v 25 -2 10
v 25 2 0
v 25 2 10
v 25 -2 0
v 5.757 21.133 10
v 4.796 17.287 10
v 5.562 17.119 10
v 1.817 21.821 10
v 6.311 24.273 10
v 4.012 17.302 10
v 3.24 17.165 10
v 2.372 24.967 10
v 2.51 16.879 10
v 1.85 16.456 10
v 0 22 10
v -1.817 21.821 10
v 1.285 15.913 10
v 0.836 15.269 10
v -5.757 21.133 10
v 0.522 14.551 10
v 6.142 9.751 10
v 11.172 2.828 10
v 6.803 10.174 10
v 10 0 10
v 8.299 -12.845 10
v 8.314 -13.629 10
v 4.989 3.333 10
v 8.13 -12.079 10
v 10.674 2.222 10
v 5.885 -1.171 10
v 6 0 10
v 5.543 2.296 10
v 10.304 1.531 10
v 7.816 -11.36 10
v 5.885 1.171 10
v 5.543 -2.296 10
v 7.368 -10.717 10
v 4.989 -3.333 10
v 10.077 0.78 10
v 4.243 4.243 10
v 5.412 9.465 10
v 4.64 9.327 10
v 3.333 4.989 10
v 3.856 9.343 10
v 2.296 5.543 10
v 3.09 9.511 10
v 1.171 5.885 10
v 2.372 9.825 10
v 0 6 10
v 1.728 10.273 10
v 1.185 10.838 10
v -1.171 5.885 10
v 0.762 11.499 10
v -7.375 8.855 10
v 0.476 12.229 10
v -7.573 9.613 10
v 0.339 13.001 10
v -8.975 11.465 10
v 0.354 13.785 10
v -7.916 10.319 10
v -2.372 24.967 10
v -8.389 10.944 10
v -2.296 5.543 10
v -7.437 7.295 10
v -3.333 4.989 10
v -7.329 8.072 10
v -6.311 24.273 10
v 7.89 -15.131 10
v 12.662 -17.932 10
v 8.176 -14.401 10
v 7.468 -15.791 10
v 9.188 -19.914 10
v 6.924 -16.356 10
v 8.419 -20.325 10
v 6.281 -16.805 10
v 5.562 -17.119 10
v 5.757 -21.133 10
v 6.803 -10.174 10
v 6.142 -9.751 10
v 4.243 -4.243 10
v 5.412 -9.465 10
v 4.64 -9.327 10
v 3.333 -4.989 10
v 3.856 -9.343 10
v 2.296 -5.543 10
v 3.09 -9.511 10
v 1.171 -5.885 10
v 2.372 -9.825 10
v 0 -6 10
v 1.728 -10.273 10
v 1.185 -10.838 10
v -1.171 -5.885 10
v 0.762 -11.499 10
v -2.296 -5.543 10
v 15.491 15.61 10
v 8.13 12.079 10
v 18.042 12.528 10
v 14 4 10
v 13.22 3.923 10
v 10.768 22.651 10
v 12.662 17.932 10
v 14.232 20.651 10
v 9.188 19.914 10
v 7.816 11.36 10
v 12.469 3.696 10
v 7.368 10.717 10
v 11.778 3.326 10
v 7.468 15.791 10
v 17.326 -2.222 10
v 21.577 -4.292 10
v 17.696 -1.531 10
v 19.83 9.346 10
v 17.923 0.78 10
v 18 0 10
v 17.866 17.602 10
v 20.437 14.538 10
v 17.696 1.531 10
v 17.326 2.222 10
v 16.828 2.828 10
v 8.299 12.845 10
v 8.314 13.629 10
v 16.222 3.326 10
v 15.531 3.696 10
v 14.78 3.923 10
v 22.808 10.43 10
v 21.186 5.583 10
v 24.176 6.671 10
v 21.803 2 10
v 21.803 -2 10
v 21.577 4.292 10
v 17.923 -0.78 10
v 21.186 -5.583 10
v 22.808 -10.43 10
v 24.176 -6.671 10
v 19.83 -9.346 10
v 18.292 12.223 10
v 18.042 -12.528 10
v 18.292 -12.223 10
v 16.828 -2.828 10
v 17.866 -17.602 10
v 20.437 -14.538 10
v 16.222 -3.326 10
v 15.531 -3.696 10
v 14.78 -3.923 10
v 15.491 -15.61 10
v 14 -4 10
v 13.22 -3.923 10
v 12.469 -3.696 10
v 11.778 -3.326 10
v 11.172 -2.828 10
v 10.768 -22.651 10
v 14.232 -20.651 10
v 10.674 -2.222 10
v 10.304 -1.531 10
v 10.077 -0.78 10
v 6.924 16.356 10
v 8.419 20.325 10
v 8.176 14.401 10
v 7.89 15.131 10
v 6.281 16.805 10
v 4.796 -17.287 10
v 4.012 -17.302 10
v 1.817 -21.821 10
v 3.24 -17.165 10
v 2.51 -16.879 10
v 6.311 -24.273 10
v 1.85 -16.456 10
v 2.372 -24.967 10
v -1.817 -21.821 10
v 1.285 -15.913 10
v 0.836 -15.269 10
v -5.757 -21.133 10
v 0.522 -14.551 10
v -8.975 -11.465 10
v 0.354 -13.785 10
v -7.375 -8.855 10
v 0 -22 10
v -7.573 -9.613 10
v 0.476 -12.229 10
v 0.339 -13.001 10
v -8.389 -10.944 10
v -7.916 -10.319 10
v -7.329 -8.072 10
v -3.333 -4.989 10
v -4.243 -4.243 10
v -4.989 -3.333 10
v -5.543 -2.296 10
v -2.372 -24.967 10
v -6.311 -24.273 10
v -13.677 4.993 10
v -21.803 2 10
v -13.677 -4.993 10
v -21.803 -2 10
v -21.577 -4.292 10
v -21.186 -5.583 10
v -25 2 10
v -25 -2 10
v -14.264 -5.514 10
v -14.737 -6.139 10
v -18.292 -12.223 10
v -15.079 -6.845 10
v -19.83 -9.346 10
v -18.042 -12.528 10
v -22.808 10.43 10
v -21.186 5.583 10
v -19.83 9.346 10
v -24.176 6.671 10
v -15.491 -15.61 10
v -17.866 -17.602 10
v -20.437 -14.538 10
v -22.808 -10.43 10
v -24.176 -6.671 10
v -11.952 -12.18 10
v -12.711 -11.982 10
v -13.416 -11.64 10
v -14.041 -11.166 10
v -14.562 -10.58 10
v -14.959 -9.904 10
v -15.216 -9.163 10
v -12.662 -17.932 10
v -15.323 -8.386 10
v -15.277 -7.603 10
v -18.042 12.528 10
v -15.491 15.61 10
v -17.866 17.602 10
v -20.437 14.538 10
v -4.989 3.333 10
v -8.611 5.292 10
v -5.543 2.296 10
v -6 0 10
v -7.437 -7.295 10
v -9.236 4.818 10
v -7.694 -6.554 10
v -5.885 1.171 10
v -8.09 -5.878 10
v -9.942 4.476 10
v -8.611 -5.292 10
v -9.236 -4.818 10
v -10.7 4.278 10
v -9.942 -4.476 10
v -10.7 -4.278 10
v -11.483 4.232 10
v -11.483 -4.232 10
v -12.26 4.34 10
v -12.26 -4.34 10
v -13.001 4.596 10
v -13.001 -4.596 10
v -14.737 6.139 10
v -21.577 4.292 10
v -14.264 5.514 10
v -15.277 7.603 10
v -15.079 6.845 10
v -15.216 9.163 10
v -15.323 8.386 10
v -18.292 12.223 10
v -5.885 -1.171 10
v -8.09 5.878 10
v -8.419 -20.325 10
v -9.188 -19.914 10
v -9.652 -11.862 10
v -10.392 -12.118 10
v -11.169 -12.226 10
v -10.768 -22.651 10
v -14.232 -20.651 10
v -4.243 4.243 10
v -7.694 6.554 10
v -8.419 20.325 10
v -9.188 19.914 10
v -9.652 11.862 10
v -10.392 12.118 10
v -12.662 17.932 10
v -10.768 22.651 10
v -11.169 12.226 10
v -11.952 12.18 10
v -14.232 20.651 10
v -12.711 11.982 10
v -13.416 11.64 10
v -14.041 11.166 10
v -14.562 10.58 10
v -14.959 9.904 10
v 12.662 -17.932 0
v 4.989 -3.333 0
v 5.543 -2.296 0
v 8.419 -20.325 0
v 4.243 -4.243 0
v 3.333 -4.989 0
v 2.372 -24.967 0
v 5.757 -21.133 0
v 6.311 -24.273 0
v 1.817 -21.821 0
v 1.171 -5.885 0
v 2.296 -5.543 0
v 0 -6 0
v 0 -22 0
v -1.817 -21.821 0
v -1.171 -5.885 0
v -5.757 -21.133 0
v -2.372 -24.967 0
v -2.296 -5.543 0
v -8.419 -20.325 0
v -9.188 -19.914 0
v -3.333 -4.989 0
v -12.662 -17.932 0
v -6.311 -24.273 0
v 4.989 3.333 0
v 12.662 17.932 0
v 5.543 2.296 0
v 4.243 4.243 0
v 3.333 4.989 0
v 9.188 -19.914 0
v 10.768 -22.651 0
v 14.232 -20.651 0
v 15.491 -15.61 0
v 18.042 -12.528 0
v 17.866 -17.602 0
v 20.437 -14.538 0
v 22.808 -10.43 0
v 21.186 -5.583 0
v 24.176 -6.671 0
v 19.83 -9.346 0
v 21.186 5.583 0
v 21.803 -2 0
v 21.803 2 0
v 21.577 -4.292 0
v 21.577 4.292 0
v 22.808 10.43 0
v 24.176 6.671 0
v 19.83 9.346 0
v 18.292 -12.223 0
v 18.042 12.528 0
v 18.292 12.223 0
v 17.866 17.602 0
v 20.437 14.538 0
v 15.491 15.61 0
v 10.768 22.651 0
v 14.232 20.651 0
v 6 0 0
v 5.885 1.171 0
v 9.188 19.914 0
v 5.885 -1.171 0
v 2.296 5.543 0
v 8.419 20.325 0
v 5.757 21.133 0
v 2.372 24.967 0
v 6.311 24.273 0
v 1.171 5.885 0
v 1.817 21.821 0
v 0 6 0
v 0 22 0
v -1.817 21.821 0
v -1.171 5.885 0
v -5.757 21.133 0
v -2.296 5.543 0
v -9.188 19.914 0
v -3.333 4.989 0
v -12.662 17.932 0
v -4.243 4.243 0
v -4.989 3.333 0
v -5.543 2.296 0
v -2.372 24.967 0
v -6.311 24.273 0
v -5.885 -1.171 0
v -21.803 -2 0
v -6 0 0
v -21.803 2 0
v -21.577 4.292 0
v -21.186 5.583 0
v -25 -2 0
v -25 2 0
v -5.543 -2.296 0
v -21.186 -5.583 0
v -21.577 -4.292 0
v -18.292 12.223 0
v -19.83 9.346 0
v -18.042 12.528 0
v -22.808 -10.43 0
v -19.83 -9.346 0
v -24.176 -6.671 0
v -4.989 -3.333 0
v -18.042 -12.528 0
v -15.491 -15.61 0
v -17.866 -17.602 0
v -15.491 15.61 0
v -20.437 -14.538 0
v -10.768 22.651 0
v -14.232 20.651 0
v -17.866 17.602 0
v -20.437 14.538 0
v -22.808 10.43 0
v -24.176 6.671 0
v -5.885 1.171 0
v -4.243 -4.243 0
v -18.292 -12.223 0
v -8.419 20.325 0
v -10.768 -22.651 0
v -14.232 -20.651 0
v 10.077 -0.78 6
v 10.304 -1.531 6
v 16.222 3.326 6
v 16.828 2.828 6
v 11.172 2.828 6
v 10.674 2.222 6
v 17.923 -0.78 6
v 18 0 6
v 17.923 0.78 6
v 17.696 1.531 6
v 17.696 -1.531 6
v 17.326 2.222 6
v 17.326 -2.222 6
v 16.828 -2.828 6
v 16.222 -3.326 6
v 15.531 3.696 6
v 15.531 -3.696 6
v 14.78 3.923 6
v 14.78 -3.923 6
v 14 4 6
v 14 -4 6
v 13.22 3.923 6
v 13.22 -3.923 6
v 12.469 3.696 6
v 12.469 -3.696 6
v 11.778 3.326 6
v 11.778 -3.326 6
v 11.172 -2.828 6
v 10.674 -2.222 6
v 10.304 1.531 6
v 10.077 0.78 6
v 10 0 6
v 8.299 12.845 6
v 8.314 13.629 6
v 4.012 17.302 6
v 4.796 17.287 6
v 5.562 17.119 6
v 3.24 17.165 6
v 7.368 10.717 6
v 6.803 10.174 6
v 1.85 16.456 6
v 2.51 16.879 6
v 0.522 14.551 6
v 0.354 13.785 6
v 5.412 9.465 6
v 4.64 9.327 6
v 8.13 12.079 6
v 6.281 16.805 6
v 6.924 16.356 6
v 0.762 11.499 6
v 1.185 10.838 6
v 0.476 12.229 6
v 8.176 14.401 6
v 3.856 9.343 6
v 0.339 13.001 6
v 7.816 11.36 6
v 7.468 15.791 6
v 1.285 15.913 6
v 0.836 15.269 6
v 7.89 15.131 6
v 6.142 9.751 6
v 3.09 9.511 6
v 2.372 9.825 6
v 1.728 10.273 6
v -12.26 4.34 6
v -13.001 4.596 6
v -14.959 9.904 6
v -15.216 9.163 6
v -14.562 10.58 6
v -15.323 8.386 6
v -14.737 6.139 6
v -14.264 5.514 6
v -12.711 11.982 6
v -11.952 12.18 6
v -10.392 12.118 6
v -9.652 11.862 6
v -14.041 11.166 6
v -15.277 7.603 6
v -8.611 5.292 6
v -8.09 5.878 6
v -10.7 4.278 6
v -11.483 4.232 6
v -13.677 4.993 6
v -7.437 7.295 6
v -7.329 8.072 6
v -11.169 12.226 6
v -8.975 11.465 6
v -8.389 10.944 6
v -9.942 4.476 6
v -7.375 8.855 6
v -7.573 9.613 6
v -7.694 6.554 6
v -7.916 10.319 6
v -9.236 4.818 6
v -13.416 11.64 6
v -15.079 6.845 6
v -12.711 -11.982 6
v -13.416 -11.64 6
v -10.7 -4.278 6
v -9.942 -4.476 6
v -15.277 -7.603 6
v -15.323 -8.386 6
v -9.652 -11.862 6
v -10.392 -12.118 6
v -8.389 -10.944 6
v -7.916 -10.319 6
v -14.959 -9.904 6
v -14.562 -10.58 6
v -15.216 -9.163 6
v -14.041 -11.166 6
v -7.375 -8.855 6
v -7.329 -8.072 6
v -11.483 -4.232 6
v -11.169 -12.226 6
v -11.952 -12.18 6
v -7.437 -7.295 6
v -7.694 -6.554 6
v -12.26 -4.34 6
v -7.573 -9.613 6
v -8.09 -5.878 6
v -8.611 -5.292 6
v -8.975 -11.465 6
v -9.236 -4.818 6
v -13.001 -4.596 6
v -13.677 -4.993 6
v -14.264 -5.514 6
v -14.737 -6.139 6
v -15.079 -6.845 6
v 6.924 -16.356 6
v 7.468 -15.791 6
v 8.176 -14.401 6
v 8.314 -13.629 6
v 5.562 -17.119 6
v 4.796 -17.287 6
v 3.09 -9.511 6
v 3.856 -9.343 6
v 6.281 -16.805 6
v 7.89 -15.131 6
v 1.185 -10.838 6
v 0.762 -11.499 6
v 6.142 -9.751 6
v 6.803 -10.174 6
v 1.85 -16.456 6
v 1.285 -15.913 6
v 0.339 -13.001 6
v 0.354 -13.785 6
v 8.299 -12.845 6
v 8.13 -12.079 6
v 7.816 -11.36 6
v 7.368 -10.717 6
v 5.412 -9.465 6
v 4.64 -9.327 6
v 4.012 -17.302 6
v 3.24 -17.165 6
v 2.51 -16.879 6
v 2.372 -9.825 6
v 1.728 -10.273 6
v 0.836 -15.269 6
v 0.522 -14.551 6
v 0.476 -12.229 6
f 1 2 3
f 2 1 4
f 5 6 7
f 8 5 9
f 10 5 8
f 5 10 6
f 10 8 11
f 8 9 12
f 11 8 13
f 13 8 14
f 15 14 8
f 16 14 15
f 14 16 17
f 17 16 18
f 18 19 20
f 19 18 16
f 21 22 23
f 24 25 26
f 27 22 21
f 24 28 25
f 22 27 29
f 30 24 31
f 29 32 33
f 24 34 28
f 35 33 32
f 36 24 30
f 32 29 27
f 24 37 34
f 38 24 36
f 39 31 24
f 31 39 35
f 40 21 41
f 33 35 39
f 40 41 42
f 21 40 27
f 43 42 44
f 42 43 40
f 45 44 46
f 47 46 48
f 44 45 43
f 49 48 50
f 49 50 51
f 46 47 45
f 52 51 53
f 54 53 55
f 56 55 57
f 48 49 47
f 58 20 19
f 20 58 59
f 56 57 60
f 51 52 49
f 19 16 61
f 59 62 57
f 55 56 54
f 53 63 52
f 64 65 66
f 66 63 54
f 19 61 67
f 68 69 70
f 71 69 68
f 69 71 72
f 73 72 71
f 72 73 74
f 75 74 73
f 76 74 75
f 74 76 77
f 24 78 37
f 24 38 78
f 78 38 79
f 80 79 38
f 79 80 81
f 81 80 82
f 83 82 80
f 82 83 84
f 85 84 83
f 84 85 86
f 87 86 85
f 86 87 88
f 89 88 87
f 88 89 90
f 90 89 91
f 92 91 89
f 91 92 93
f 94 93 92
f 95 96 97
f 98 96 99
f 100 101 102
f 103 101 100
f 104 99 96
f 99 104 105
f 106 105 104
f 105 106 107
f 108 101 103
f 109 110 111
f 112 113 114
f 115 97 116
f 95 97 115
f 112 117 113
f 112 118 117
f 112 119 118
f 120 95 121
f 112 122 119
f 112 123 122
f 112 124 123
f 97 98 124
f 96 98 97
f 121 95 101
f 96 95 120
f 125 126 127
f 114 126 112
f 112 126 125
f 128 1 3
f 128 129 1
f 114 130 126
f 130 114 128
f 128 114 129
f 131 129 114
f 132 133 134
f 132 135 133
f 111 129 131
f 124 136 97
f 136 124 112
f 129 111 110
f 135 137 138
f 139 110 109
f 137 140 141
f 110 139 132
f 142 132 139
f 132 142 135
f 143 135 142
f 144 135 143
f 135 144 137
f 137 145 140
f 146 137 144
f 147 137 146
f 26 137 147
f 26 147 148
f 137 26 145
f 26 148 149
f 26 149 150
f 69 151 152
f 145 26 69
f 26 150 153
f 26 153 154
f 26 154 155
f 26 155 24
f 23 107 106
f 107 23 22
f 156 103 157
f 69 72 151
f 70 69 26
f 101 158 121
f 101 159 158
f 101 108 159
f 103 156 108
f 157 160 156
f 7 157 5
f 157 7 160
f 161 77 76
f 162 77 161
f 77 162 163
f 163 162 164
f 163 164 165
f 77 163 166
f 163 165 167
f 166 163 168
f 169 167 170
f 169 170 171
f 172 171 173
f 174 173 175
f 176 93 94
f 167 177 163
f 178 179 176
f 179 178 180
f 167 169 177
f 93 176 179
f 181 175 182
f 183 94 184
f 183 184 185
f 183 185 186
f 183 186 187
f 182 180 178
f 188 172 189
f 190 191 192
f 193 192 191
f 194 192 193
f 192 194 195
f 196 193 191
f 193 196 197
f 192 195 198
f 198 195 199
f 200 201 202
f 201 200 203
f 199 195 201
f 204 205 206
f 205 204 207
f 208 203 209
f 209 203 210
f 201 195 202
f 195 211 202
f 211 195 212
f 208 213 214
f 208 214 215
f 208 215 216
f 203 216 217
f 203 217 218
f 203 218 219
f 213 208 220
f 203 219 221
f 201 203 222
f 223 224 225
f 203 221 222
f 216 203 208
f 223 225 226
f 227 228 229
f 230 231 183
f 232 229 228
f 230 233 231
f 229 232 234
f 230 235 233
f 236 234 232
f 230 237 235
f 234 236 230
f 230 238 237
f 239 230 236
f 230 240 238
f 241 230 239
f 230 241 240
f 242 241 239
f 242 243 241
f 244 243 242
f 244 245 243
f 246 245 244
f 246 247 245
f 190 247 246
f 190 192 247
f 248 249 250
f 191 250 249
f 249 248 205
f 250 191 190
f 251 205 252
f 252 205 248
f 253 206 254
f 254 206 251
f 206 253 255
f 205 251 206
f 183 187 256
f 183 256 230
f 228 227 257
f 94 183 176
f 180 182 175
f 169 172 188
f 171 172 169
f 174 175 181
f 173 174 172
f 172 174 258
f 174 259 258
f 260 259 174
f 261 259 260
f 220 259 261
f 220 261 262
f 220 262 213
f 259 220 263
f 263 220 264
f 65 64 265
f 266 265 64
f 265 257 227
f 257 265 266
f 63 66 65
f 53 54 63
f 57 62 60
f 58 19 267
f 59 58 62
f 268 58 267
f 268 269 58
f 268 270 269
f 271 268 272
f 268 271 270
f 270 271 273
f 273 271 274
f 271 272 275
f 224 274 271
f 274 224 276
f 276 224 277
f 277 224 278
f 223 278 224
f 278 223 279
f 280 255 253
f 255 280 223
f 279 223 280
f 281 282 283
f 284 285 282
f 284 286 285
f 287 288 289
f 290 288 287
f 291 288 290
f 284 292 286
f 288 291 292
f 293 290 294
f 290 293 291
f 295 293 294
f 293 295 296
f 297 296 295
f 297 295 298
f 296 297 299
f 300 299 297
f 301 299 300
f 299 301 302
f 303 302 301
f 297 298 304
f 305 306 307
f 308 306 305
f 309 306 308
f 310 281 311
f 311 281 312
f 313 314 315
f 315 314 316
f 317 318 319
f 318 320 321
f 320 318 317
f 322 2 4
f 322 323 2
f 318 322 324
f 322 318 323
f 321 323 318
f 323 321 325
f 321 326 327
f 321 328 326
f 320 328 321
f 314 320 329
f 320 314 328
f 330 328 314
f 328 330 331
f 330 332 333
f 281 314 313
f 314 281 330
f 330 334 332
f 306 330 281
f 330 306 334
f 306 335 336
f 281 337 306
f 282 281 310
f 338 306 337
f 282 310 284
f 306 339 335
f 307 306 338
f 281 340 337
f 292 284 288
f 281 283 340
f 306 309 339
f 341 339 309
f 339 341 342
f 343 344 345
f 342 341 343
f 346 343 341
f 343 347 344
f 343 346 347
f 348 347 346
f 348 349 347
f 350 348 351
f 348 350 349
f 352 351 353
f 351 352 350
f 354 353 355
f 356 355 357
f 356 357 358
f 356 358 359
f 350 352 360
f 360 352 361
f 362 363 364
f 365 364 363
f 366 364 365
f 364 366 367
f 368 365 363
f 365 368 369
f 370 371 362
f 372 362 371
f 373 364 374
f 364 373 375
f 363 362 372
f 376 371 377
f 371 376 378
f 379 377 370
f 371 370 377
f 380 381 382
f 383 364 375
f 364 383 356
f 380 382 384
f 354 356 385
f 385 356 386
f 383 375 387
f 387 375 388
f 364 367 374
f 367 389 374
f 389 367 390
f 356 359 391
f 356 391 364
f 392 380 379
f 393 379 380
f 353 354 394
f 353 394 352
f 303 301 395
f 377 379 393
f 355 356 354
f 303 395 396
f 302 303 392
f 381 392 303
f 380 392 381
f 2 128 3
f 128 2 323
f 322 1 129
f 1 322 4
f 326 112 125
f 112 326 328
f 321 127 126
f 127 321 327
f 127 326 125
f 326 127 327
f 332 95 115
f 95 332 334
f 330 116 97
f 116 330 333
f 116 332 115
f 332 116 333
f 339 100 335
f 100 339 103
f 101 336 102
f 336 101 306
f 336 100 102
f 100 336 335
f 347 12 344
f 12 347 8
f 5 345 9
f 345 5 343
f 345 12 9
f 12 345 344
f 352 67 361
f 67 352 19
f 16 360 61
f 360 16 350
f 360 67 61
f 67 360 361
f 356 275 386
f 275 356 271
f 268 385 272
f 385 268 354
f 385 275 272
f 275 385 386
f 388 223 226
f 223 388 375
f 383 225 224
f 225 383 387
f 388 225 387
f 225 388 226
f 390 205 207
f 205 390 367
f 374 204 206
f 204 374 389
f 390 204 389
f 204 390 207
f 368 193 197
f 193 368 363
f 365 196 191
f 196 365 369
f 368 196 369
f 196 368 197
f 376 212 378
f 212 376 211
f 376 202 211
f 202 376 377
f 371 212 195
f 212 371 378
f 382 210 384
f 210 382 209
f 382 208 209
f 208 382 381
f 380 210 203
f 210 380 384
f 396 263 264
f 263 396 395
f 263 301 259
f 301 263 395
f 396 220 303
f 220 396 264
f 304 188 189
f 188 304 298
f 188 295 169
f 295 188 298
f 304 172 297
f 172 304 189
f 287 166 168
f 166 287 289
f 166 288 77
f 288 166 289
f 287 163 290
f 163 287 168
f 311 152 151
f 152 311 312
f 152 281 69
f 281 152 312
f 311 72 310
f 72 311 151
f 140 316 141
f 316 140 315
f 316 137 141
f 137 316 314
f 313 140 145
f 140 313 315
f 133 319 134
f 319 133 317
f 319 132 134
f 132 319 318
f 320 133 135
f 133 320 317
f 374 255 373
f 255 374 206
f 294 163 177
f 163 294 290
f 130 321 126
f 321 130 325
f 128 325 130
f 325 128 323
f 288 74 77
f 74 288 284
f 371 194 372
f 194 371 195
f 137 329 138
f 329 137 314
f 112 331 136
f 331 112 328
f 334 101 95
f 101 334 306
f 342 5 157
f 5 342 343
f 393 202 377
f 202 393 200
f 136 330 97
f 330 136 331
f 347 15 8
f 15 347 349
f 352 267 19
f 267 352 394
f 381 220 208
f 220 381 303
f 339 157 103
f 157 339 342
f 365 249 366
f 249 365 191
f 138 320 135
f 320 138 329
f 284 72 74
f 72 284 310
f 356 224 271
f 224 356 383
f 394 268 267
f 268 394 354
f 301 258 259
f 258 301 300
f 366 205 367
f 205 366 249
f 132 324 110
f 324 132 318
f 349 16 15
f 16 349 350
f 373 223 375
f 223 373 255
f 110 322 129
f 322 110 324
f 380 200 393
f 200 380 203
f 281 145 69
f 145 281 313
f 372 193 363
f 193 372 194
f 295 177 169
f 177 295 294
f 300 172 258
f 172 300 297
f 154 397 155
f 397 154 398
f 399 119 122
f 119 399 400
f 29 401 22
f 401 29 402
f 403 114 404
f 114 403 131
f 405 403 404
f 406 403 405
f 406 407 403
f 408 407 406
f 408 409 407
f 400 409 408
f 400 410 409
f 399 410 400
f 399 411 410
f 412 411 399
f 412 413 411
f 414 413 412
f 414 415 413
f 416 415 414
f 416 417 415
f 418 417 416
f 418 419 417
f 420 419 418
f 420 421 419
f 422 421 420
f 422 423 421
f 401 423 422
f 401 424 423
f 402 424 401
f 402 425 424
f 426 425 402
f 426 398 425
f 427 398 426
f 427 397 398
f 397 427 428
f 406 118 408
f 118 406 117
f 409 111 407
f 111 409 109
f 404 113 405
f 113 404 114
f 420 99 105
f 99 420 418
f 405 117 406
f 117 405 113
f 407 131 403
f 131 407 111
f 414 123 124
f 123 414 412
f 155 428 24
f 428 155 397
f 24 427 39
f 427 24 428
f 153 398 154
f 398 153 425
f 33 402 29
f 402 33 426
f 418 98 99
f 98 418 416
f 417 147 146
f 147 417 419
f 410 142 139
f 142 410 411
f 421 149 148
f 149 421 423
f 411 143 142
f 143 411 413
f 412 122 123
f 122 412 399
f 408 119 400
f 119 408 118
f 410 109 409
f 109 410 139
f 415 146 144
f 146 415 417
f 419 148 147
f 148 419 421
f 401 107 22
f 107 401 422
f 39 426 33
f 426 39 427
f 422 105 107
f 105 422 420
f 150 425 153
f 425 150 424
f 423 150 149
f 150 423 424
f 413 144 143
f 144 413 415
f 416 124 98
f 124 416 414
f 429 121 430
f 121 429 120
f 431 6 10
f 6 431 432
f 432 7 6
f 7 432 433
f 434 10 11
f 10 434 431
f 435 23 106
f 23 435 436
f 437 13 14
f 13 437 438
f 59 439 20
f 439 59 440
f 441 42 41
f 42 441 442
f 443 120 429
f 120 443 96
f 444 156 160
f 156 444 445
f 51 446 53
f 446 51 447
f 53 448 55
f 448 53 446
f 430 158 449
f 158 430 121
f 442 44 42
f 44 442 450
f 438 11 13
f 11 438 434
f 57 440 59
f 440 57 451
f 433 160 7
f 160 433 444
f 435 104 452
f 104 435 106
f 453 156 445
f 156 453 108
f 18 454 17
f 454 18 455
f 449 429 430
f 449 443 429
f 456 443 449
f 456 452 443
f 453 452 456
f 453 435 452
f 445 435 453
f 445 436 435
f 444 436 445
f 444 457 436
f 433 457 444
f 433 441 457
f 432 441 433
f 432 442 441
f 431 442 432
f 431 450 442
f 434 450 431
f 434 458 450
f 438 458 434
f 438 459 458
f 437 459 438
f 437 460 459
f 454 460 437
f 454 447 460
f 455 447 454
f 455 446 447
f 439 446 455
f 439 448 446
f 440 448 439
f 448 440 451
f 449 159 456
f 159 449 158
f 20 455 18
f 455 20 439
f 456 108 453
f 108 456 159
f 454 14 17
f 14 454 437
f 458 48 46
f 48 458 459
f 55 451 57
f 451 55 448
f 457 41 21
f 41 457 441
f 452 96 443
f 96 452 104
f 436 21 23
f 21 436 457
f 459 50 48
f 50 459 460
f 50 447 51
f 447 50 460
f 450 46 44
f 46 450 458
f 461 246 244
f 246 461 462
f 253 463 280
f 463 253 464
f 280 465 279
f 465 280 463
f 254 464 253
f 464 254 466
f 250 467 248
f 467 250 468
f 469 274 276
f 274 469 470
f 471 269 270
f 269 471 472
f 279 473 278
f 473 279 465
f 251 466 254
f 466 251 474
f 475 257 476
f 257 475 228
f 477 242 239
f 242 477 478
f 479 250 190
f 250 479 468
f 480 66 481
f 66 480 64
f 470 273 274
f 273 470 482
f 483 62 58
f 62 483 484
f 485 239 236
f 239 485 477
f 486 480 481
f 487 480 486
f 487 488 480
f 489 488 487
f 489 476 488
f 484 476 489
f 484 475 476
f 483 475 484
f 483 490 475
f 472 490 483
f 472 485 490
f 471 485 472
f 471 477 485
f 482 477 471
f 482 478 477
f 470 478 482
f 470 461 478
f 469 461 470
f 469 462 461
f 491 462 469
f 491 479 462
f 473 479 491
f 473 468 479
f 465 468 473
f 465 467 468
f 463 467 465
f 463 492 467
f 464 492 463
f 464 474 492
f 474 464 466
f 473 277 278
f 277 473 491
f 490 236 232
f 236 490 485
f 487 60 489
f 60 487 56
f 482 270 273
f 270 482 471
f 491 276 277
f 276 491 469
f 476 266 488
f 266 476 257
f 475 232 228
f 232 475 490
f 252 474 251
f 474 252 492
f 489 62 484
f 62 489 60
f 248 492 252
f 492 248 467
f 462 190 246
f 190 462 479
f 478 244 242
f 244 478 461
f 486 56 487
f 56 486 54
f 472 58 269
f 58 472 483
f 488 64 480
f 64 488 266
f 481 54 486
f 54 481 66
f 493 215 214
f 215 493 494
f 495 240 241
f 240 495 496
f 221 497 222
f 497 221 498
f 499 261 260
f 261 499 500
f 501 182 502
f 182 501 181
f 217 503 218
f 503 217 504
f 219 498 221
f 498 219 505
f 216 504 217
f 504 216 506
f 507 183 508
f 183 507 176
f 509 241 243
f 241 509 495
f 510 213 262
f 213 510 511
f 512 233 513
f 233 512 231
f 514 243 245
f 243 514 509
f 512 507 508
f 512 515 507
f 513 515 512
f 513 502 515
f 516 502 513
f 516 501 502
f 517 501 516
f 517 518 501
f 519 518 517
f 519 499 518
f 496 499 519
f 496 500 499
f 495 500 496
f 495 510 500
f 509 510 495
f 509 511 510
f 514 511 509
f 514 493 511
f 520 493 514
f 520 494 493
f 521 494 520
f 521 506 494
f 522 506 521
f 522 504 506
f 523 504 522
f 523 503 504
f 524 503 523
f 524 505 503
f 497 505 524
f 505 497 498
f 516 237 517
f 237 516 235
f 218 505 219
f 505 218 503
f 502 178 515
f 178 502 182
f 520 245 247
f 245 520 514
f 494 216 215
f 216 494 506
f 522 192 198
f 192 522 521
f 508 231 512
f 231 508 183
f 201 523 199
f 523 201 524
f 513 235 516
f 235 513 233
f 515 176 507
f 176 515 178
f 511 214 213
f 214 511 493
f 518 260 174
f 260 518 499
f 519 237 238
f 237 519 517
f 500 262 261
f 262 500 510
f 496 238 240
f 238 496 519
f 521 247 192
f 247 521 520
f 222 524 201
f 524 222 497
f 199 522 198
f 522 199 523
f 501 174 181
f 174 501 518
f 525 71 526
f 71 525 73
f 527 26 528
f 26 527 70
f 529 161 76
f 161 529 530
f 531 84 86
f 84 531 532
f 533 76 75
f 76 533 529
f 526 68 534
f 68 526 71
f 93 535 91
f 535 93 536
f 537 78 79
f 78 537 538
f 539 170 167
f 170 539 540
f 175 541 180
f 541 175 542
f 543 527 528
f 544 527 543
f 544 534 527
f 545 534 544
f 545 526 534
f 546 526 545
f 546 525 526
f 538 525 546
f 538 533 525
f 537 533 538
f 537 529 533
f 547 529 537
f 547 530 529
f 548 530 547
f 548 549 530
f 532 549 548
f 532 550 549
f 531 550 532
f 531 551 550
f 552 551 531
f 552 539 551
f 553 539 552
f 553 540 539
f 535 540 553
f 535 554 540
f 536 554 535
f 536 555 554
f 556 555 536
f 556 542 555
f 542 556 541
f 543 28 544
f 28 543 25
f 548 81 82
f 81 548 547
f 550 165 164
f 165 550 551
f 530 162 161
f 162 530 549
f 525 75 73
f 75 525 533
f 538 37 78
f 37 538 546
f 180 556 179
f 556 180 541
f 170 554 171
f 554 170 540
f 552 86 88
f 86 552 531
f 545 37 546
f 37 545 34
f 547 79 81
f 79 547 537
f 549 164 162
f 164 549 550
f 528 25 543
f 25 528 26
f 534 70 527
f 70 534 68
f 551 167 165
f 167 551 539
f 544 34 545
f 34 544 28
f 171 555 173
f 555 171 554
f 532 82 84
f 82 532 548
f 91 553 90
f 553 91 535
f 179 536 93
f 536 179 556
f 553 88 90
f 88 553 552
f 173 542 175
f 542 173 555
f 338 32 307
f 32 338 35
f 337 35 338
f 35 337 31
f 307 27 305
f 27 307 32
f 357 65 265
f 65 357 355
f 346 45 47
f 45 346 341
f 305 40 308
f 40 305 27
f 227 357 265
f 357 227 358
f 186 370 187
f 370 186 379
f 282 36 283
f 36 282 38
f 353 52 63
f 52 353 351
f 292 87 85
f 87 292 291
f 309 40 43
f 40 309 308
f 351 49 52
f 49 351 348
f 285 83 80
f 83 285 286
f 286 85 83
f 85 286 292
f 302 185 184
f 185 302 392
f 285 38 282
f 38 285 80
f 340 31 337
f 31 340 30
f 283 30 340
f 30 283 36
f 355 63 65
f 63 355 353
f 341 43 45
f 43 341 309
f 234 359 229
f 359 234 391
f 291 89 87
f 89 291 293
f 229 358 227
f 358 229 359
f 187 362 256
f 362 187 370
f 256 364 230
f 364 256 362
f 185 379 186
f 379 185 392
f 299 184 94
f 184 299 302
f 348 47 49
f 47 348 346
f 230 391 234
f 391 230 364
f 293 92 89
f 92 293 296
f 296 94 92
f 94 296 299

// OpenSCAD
$fn = 32;

// ----------------------------------------------------------------------
// Spur blank: lightened gear blank
// ----------------------------------------------------------------------

// --- parameters (mm) ---
disc_r = 22;              // blank root radius
disc_t = 10;              // blank thickness
n_teeth = 18;             // stub tooth count
tooth_w = 4;              // tooth width at the root
tooth_h = 3;              // tooth height above the root
bore_r = 6;               // central bore radius
ring_r = 14;              // lightening pocket ring radius
pocket_r = 4;             // lightening pocket radius

out_r = disc_r + tooth_h;  // tip radius
bbox_x = 50.0;  // measured width over the teeth
bbox_y = 49.93;  // measured depth over the teeth

difference() {
union() {
  cylinder(r = disc_r, h = disc_t);
  for (i = [0 : n_teeth - 1])
    rotate([0, 0, i * 360 / n_teeth])
      translate([disc_r - 1, -tooth_w / 2, 0])
        cube([tooth_h + 1, tooth_w, disc_t]);
}
  translate([0, 0, -1]) cylinder(r = bore_r, h = disc_t + 2);
  for (i = [0 : 5])
    rotate([0, 0, i * 72])
      translate([ring_r, 0, disc_t - 4])
        cylinder(r = pocket_r, h = 5);
}
